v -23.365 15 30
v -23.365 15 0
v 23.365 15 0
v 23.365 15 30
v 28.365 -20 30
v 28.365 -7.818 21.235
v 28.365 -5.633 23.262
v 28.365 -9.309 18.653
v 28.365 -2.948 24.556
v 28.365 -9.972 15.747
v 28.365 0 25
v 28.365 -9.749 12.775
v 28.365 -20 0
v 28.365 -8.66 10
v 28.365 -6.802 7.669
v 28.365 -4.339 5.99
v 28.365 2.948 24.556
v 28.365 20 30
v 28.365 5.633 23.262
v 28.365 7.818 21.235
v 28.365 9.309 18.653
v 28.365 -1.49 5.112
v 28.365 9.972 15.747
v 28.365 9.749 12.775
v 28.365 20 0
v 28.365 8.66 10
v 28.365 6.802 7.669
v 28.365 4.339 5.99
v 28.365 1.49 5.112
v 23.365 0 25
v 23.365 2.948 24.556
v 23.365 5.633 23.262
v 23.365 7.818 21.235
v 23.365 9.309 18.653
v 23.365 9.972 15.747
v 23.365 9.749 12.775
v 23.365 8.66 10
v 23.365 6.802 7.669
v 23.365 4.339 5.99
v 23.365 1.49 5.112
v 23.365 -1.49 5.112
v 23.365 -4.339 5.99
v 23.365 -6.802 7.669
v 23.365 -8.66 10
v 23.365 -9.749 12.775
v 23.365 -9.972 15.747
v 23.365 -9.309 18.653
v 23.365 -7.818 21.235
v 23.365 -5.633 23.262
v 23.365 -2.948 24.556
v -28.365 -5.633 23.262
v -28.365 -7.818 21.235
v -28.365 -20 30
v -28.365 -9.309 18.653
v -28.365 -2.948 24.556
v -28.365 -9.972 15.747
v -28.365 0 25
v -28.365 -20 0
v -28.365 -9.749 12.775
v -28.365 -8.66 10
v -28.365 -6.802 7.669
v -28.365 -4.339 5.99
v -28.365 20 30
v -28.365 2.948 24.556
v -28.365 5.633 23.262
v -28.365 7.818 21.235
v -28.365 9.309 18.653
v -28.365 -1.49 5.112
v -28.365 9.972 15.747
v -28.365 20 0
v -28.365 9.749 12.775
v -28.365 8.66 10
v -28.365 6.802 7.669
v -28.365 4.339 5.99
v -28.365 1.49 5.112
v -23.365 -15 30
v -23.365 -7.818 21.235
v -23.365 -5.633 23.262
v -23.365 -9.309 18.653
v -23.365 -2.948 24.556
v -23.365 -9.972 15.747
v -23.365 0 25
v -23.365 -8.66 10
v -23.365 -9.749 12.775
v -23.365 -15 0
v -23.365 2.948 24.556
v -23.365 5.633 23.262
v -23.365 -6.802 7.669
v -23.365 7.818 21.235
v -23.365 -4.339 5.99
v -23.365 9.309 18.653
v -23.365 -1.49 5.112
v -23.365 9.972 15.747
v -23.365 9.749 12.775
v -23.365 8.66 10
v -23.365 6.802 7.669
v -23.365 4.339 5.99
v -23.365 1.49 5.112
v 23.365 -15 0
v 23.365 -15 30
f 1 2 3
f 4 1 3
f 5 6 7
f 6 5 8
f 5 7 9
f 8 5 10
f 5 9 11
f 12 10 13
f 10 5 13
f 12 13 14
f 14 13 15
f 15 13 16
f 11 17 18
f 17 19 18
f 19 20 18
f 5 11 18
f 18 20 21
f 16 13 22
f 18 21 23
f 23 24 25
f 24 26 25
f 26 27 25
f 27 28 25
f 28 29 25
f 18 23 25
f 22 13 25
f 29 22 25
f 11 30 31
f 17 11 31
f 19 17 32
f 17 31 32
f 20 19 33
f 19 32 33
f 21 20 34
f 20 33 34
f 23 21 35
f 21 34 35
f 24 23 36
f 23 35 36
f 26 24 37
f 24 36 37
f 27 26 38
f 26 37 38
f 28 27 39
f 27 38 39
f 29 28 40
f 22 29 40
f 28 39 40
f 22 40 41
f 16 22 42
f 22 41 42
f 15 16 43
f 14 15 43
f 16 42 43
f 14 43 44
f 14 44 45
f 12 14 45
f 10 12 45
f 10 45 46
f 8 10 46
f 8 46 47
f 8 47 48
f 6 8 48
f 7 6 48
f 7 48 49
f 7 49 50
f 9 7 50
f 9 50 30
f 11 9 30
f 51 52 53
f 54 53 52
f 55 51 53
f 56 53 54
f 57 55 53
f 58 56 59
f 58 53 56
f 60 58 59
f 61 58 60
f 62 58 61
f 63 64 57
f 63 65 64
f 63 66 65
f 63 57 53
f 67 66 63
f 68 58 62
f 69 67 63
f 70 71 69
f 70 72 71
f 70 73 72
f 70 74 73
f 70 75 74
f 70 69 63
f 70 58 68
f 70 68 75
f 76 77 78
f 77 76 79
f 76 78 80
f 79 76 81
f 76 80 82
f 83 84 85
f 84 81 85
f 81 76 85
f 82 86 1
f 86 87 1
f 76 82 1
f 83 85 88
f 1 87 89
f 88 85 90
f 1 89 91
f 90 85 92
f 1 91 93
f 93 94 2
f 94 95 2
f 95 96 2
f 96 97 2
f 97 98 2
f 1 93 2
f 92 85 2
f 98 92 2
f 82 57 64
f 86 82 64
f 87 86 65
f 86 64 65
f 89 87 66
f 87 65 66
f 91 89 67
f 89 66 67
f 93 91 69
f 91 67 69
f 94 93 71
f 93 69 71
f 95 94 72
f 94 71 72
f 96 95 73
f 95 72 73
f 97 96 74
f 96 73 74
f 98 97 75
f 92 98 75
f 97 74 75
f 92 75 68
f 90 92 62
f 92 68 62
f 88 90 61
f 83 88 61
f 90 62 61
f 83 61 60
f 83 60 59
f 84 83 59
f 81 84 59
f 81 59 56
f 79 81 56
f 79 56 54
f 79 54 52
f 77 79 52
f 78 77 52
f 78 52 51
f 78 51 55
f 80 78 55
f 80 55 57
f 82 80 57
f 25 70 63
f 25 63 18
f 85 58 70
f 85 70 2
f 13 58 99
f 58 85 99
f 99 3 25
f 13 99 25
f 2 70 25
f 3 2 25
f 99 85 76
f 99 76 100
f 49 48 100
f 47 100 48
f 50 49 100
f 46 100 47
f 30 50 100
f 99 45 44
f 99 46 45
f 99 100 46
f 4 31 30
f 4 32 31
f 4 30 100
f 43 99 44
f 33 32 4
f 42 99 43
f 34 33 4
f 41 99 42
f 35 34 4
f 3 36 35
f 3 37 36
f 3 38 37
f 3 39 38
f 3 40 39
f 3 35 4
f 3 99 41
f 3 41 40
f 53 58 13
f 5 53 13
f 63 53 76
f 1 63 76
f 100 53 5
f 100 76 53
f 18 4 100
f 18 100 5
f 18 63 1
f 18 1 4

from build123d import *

# Parameters (mm, degrees)
SKETCH1_W           = 56.729559748
SKETCH1_H           = 40
SKETCH1_W_2         = 46.729559748
SKETCH1_H_2         = 30
EXTRUDE_THIN1_DEPTH = 30
SKETCH2_R           = 10
CUT_EXTRUDE1_DEPTH  = 68.217876709


with BuildPart() as part:
    # Sketch1 → Extrude-Thin1 (new body)
    with BuildSketch(Plane.XY):
        Rectangle(SKETCH1_W, SKETCH1_H)
        Rectangle(SKETCH1_W_2, SKETCH1_H_2, mode=Mode.SUBTRACT)
    extrude(amount=EXTRUDE_THIN1_DEPTH)

    # Sketch2 → Cut-Extrude1 (cut, through all)
    with BuildSketch(Plane.ZY.offset(28.364779874)):
        with Locations((15, 0)):
            Circle(SKETCH2_R)
    extrude(amount=-CUT_EXTRUDE1_DEPTH, mode=Mode.SUBTRACT)


solid = part.part
